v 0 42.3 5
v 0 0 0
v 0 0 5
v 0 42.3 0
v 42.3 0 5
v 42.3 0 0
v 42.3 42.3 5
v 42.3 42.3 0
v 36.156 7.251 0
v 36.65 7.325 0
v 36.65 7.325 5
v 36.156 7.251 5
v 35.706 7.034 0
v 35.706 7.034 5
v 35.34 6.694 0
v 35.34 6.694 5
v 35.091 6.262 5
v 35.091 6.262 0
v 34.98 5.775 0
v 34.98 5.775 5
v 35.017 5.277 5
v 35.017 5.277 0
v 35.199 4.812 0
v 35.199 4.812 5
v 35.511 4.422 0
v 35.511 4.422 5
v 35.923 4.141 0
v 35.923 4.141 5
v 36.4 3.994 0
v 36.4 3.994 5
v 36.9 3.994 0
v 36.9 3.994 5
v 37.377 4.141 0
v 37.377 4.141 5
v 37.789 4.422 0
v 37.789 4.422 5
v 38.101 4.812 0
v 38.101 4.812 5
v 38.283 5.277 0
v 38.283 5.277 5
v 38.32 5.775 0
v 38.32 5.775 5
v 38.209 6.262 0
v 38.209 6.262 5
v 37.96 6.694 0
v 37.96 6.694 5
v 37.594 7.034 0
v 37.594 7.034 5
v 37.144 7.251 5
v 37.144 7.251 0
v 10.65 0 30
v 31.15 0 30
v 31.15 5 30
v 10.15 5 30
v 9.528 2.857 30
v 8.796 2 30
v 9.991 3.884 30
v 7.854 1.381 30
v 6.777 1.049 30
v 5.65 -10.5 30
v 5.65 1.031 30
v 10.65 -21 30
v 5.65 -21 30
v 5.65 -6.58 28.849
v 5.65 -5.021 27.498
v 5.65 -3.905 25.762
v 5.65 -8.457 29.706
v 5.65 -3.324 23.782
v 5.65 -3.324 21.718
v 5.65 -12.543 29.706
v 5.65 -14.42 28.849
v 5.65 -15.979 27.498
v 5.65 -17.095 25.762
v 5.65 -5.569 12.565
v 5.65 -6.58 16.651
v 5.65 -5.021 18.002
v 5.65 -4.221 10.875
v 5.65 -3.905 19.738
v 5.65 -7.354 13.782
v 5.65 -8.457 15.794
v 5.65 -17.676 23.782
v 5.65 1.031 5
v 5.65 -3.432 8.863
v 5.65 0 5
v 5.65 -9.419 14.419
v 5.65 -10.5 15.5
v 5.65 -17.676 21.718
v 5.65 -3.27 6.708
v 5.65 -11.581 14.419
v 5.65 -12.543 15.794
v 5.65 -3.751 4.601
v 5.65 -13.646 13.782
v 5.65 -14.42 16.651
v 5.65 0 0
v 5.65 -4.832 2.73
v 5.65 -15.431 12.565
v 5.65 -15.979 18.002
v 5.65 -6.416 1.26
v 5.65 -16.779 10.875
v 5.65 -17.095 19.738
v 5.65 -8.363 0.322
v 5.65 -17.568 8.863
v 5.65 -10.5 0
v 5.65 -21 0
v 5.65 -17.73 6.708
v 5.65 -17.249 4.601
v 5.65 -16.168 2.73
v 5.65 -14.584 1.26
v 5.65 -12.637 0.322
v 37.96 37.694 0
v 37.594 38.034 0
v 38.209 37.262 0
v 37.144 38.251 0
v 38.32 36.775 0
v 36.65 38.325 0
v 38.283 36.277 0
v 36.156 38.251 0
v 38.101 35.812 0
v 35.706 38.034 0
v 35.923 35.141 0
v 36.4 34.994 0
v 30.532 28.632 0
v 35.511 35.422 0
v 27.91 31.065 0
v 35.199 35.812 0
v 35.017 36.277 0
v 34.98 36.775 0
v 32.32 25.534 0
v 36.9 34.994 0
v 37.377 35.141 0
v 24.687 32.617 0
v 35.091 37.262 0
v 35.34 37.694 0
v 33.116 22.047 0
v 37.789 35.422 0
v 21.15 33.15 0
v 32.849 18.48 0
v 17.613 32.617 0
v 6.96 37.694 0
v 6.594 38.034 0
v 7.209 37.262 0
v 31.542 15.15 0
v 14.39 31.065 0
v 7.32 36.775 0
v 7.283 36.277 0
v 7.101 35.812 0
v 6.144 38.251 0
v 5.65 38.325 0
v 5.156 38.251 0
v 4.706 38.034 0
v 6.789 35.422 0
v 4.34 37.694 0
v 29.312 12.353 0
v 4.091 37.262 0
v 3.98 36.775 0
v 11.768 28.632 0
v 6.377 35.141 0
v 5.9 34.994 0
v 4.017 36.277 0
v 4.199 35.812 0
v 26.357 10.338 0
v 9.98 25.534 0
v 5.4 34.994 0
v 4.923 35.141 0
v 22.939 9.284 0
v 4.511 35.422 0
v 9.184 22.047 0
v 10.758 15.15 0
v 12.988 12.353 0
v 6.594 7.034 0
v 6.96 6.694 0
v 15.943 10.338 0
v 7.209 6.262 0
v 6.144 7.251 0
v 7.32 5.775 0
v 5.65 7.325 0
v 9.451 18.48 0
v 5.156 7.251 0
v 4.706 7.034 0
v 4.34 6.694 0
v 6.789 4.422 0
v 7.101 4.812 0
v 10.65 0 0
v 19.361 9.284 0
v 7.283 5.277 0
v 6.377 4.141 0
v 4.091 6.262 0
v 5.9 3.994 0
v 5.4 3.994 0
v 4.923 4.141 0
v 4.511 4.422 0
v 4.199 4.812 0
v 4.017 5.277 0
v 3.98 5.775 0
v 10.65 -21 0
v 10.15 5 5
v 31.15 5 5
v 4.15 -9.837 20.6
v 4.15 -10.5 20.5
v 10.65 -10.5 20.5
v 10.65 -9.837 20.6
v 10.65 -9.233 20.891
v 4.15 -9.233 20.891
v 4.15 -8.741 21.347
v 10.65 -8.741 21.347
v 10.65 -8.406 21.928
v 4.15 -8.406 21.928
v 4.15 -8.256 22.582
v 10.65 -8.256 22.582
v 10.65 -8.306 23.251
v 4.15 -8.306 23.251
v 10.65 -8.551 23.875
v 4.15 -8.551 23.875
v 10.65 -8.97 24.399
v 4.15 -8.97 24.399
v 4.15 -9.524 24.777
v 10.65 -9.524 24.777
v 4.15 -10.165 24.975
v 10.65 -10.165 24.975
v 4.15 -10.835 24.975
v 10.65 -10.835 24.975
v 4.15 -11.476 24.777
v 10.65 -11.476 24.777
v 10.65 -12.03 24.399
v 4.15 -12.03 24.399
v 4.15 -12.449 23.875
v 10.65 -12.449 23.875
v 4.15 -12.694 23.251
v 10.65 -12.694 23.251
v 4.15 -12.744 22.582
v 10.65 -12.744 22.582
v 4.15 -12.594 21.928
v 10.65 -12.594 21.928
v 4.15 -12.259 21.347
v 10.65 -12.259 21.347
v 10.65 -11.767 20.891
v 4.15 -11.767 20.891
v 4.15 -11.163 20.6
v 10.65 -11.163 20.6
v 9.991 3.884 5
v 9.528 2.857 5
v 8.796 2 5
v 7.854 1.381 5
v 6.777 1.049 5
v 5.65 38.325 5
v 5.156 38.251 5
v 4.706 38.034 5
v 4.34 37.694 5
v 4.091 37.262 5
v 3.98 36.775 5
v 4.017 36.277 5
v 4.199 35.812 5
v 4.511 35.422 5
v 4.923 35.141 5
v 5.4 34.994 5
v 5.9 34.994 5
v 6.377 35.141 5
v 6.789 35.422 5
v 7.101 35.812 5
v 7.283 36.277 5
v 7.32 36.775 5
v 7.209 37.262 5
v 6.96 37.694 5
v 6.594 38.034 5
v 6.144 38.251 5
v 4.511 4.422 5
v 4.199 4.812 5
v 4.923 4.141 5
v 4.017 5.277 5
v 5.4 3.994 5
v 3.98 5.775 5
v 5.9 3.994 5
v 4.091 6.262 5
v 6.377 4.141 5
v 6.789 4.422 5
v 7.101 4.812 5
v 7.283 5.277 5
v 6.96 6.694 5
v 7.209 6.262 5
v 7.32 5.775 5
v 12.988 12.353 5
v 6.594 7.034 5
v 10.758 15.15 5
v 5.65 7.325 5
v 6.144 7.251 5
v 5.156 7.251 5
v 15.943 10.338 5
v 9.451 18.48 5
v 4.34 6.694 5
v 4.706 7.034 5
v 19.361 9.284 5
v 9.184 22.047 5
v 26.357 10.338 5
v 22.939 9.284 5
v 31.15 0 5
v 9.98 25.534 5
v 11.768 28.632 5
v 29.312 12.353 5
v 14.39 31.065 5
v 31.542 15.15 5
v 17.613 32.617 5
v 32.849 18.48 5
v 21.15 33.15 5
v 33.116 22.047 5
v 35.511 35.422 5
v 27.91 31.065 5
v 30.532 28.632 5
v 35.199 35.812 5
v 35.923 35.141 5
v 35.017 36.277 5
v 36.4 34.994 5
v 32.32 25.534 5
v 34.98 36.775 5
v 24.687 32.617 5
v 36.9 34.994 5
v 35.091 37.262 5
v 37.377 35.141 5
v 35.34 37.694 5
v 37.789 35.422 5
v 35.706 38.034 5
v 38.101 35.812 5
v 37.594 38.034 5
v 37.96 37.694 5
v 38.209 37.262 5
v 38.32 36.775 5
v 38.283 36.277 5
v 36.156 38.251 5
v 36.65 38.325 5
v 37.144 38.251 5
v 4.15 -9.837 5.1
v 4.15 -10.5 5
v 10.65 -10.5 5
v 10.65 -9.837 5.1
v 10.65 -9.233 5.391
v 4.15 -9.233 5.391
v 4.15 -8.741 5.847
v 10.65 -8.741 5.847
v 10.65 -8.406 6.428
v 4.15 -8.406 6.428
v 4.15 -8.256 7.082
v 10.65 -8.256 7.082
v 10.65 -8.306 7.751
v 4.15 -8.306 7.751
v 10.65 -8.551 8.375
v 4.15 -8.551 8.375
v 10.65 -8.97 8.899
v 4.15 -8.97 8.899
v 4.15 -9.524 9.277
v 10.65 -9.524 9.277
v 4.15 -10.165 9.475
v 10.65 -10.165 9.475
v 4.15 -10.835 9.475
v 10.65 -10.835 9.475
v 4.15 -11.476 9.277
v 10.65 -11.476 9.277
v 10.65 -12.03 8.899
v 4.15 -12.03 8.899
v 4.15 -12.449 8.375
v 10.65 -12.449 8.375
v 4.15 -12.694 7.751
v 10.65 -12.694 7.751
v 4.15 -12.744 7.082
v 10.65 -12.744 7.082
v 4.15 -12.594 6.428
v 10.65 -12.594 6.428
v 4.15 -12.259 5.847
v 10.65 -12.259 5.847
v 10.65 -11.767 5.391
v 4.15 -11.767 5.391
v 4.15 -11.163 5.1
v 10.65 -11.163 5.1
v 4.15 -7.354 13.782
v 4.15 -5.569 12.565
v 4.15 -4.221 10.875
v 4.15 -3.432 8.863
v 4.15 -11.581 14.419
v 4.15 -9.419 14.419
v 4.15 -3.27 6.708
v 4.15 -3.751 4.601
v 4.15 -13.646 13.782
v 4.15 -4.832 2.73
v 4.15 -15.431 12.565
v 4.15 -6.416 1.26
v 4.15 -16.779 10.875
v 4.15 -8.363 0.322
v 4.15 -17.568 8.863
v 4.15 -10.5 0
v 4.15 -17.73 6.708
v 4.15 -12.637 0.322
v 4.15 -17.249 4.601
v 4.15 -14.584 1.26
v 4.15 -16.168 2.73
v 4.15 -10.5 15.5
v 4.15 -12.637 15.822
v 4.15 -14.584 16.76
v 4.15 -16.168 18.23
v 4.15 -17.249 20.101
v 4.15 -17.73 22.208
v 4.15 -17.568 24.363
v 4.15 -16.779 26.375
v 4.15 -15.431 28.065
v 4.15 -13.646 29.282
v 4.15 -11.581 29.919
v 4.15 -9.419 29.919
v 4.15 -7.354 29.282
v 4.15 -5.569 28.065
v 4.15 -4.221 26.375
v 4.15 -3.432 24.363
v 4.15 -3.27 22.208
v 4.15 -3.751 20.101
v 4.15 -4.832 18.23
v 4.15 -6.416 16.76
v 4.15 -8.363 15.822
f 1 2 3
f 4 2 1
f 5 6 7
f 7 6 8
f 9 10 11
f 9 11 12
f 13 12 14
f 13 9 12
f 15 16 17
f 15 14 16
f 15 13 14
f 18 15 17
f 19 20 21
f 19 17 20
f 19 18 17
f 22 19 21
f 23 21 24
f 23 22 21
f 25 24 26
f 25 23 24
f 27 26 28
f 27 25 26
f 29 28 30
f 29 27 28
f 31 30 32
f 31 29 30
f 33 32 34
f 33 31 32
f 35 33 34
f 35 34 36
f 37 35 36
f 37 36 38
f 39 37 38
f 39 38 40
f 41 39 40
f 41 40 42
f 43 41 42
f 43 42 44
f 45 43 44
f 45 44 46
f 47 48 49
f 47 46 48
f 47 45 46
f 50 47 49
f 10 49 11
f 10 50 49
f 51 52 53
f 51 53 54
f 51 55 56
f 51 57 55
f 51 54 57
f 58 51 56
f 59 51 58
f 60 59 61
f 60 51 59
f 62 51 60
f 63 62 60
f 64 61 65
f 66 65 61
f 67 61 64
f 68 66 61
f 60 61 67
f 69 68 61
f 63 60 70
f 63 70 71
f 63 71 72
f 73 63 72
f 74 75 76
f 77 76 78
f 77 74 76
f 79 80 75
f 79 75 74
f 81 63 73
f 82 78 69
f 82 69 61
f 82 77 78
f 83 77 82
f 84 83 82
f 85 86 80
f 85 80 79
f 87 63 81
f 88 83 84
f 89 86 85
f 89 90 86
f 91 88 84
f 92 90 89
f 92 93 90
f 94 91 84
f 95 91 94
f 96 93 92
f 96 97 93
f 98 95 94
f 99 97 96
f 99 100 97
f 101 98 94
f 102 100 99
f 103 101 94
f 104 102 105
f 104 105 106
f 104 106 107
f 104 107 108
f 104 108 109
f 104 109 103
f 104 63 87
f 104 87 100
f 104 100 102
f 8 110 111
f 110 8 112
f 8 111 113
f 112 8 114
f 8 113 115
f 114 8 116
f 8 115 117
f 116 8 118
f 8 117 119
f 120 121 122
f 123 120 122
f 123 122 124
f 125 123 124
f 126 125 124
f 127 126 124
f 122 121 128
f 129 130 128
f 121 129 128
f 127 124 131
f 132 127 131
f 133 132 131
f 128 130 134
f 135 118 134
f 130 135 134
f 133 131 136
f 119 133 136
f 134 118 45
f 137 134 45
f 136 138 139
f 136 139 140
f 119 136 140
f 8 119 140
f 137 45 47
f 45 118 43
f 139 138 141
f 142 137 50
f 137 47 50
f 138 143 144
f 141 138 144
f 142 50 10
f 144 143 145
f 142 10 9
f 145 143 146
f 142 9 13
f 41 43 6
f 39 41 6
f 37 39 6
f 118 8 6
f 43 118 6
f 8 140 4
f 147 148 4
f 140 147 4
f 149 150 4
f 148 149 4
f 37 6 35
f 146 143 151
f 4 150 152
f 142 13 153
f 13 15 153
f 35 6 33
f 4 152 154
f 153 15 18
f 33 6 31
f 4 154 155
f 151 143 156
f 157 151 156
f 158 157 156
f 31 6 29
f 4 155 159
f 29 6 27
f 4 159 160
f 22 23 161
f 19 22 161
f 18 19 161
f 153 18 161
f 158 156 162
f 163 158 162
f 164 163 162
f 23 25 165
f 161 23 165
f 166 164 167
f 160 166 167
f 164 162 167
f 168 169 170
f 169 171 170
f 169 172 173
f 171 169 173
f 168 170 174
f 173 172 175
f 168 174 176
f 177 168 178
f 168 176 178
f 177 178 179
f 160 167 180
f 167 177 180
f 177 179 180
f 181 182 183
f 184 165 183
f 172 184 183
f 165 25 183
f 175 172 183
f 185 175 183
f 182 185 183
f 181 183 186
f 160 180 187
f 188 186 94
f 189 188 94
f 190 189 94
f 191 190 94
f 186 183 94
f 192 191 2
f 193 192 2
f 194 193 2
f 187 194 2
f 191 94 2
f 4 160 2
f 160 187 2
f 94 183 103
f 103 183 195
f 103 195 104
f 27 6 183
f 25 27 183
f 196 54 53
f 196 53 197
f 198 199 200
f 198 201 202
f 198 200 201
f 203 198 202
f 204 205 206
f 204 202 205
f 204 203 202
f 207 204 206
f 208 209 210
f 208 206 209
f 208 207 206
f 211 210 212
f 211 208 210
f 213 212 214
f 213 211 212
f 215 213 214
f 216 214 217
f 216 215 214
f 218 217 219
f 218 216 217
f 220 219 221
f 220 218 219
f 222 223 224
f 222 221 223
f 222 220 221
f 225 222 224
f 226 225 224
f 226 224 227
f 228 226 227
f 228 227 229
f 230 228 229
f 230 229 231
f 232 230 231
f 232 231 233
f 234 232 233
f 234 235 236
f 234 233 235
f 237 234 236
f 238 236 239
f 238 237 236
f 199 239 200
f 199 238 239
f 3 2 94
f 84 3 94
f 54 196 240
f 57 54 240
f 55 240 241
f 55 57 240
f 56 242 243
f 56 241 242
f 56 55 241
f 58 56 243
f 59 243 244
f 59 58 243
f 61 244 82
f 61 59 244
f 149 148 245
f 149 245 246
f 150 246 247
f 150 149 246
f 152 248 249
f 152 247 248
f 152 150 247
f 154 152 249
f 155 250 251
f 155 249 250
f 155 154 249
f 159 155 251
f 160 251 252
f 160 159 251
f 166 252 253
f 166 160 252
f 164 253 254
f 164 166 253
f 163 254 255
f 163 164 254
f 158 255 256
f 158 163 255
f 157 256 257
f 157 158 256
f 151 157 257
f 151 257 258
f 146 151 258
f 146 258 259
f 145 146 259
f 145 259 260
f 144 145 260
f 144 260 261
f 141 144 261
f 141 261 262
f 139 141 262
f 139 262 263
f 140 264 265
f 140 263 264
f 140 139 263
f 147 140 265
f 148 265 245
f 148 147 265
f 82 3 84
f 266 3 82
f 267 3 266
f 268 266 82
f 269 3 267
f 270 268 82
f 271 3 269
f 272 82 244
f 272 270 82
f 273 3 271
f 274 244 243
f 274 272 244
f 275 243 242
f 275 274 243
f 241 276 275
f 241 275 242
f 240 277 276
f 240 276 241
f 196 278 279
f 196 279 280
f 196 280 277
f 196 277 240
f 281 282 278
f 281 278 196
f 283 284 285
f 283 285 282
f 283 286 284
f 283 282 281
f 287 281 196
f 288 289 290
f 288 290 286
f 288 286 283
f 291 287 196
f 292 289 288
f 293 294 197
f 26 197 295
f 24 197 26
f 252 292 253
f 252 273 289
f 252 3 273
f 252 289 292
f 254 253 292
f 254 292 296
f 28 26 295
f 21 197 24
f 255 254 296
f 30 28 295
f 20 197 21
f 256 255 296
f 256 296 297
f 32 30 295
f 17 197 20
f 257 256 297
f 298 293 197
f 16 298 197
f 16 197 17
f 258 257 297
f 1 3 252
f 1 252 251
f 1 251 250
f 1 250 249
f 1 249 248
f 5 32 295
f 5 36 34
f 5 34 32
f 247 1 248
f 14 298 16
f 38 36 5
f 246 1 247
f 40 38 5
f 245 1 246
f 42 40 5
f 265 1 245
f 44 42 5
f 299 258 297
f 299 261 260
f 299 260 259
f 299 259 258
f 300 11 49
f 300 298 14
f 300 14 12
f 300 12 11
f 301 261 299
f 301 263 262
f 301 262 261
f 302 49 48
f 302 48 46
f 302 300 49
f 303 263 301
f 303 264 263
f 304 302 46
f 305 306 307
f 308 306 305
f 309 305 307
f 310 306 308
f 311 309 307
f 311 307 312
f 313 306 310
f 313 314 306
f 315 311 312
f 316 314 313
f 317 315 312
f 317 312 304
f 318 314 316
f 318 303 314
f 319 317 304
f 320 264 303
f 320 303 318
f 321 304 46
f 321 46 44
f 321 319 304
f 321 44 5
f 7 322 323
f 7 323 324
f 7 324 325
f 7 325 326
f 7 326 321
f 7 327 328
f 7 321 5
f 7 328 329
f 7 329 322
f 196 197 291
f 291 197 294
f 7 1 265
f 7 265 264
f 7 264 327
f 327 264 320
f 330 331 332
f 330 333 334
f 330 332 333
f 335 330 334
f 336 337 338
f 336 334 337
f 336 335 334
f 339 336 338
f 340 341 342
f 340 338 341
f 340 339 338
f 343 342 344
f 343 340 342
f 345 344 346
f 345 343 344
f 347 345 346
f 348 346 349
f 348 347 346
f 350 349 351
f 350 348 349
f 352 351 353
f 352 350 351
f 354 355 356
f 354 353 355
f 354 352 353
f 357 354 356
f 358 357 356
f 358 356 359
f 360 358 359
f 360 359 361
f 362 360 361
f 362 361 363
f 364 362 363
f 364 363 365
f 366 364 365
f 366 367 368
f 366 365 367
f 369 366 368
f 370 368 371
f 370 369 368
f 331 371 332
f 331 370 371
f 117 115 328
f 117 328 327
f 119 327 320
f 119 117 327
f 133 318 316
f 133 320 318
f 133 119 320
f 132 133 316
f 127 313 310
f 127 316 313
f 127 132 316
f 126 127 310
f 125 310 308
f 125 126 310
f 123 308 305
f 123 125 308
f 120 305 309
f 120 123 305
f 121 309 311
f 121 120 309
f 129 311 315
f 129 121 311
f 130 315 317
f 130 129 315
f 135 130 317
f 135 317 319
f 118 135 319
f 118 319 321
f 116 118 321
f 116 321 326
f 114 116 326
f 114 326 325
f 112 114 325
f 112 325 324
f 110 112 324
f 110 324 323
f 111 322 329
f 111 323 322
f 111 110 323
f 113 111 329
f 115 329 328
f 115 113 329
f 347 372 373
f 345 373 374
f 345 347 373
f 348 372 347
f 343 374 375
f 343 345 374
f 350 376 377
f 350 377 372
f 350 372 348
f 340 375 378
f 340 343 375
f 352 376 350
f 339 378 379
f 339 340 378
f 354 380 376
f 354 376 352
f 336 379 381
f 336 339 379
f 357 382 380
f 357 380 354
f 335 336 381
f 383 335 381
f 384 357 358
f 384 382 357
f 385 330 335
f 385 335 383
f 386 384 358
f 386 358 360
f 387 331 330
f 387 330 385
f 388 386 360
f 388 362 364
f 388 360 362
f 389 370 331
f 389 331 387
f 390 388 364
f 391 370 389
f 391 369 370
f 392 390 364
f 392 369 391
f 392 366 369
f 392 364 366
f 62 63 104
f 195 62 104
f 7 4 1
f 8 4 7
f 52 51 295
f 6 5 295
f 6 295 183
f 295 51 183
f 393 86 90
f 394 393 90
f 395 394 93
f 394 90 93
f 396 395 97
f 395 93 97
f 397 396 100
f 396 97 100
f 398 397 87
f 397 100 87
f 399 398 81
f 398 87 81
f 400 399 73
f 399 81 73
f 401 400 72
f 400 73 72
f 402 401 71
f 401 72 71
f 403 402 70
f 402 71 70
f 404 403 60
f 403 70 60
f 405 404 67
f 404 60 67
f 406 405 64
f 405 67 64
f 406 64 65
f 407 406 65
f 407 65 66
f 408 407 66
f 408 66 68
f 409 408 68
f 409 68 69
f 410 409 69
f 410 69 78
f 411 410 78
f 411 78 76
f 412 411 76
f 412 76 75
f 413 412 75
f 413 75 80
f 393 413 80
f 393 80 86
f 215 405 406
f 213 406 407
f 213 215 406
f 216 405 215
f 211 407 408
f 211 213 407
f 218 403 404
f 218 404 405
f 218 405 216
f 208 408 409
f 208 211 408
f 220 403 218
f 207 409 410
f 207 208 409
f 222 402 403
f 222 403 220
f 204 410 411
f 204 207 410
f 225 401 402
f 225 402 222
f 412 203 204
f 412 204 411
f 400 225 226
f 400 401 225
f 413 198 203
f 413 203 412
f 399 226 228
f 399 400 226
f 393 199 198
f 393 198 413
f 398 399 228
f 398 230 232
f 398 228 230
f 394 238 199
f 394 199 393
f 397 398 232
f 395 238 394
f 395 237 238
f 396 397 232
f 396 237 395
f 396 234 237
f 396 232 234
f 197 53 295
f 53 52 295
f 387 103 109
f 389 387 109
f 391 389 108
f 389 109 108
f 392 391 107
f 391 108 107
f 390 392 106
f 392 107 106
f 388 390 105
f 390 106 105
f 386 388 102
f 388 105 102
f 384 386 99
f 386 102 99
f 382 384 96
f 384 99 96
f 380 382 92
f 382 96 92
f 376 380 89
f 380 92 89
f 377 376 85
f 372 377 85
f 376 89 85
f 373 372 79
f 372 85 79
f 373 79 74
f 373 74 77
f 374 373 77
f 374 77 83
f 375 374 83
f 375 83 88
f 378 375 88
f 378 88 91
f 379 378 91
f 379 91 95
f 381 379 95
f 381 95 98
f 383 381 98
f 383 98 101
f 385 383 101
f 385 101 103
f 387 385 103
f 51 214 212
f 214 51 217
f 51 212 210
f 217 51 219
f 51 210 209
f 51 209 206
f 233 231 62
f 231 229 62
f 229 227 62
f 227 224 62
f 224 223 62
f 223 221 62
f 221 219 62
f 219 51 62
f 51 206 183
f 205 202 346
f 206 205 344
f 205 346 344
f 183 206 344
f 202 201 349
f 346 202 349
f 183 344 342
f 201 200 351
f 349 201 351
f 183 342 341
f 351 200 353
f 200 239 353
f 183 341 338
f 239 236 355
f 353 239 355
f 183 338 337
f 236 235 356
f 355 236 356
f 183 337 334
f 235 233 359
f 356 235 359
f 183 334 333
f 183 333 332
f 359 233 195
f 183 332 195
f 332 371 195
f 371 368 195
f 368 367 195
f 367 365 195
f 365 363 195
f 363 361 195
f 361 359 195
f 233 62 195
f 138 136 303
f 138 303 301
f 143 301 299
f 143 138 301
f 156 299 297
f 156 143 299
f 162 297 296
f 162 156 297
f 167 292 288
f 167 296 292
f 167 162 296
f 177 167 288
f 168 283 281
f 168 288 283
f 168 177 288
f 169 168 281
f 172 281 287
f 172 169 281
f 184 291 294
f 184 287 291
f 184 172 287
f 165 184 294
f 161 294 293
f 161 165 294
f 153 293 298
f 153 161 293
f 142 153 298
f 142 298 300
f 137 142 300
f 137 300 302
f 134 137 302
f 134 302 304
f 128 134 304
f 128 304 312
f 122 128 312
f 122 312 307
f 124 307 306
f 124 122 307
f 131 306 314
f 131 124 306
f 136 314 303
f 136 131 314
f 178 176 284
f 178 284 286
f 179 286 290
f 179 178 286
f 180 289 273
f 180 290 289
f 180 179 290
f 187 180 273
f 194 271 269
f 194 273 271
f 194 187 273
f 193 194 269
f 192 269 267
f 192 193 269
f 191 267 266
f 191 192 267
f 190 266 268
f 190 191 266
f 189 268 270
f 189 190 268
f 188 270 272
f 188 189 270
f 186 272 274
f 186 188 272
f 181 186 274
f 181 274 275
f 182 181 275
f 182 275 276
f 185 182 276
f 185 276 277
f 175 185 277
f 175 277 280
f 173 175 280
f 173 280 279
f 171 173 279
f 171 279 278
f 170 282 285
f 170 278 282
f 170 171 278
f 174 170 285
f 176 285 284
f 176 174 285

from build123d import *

# Parameters (mm, degrees)
CUBE003_W                     = 500
CUBE003_H                     = 500
CUBE003_DEPTH                 = 500
CYLINDER006_R                 = 2.25
CYLINDER006_DEPTH             = 1000
CYLINDER005_R                 = 2.25
CYLINDER005_DEPTH             = 1000
CYLINDER004_R                 = 7.25
CYLINDER004_DEPTH             = 6.5
CYLINDER003_R                 = 7.25
CYLINDER003_DEPTH             = 6.5
GROUP003_PLACEMENT_ANGLE      = 180
CYLINDER002_R                 = 7.25
CYLINDER002_DEPTH             = 6.5
CYLINDER001_R                 = 7.25
CYLINDER001_DEPTH             = 6.5
CYLINDER_R                    = 4
CYLINDER_DEPTH                = 200
CUBE002_W                     = 60
CUBE002_H                     = 21
CUBE002_DEPTH                 = 21
CUBE001_W                     = 30
CUBE001_H                     = 31
CUBE001_DEPTH                 = 26
DIFFERENCE002_PITCH_ANGLE     = 90
DIFFERENCE002_PLACEMENT_ANGLE = 90
REFINELINEAREXTRUDE_R         = 12
REFINELINEAREXTRUDE_R_2       = 1.675
LINEAREXTRUDE_DEPTH           = 20
CUBE_W                        = 42.3
CUBE_H                        = 42.3
CUBE_DEPTH                    = 5


with BuildPart() as cube003:
    # cube003 → cube003 (new body)
    with BuildSketch(Plane(origin=(-250, -510, -250), x_dir=(1, 0, 0), z_dir=(0, 0, 1))):
        with Locations((250, 250)):
            Rectangle(CUBE003_W, CUBE003_H)
    extrude(amount=CUBE003_DEPTH)


with BuildPart() as cylinder006:
    # cylinder006 → cylinder006 (new body)
    with BuildSketch(Plane(origin=(15.5, 500, 0), x_dir=(1, 0, 0), z_dir=(0, -1, 0))):
        Circle(CYLINDER006_R)
    extrude(amount=CYLINDER006_DEPTH)


with BuildPart() as union002:
    # cylinder005 → cylinder005 (new body)
    with BuildSketch(Plane.XZ.offset(-500)):
        Circle(CYLINDER005_R)
    extrude(amount=CYLINDER005_DEPTH)

    # Group005: union cylinder006
    add(cylinder006.part)


with BuildPart() as union002_1:
    # Group005 placement: moved
    add(union002.part.moved(Location((2.25, 0, -15.5))))

    # union002: union cube003
    add(cube003.part)


with BuildPart() as cylinder004:
    # cylinder004 → cylinder004 (new body)
    with BuildSketch(Plane(origin=(15.5, 0, 0), x_dir=(1, 0, 0), z_dir=(0, -1, 0))):
        Circle(CYLINDER004_R)
    extrude(amount=CYLINDER004_DEPTH)


with BuildPart() as group003:
    # cylinder003 → cylinder003 (new body)
    with BuildSketch(Plane.XZ):
        Circle(CYLINDER003_R)
    extrude(amount=CYLINDER003_DEPTH)

    # Group003: union cylinder004
    add(cylinder004.part)


with BuildPart() as group003_1:
    # Group003 placement: moved
    add(group003.part.moved(Location((2.25, 10.5, -15.5))).rotate(Axis((2.25, 10.5, -15.5), (1, 0, 0)), GROUP003_PLACEMENT_ANGLE))


with BuildPart() as cylinder002:
    # cylinder002 → cylinder002 (new body)
    with BuildSketch(Plane(origin=(15.5, 0, 0), x_dir=(1, 0, 0), z_dir=(0, -1, 0))):
        Circle(CYLINDER002_R)
    extrude(amount=CYLINDER002_DEPTH)


with BuildPart() as group004:
    # cylinder001 → cylinder001 (new body)
    with BuildSketch(Plane.XZ):
        Circle(CYLINDER001_R)
    extrude(amount=CYLINDER001_DEPTH)

    # Group002: union cylinder002
    add(cylinder002.part)


with BuildPart() as group004_1:
    # Group002 placement: moved
    add(group004.part.moved(Location((2.25, -10.5, -15.5))))

    # Group004: union Group003
    add(group003_1.part)


with BuildPart() as cylinder:
    # cylinder → cylinder (new body)
    with BuildSketch(Plane(origin=(-100, 15, 13), x_dir=(0, 1, 0), z_dir=(1, 0, 0))):
        Circle(CYLINDER_R)
    extrude(amount=CYLINDER_DEPTH)


with BuildPart() as union:
    # cube002 → cube002 (new body)
    with BuildSketch(Plane(origin=(-30, -10.5, -13), x_dir=(1, 0, 0), z_dir=(0, 0, 1))):
        with Locations((30, 10.5)):
            Rectangle(CUBE002_W, CUBE002_H)
    extrude(amount=CUBE002_DEPTH)

    # union: union cylinder
    add(cylinder.part)


with BuildPart() as difference002:
    # cube001 → cube001 (new body)
    with BuildSketch(Plane(origin=(-15, -15.5, -13), x_dir=(1, 0, 0), z_dir=(0, 0, 1))):
        with Locations((15, 15.5)):
            Rectangle(CUBE001_W, CUBE001_H)
    extrude(amount=CUBE001_DEPTH)

    # difference001: cut union
    add(union.part, mode=Mode.SUBTRACT)


with BuildPart() as difference002_1:
    # difference001 placement: moved
    add(difference002.part.moved(Location((10, 0, -13))))

    # union001: union Group004
    add(group004_1.part)

    # difference002: cut union002
    add(union002_1.part, mode=Mode.SUBTRACT)


with BuildPart() as difference002_2:
    # difference002 pitch: moved
    add(difference002_1.part.rotate(Axis((0, 0, 0), (0, 1, 0)), DIFFERENCE002_PITCH_ANGLE))


with BuildPart() as difference002_3:
    # difference002 placement: moved
    add(difference002_2.part.moved(Location((21.15, 5, 25))).rotate(Axis((21.15, 5, 25), (0, 0, 1)), DIFFERENCE002_PLACEMENT_ANGLE))


with BuildPart() as linearextrude:
    # RefineLinearExtrude → LinearExtrude (new body)
    with BuildSketch(Plane(origin=(0, 0, 0), x_dir=(0, 1, 0), z_dir=(0, 0, 1))):
        Circle(REFINELINEAREXTRUDE_R)
        with Locations((15.5, -15.5)):
            Circle(REFINELINEAREXTRUDE_R_2)
        with Locations((15.5, 15.5)):
            Circle(REFINELINEAREXTRUDE_R_2)
        with Locations((-15.5, 15.5)):
            Circle(REFINELINEAREXTRUDE_R_2)
        with Locations((-15.5, -15.5)):
            Circle(REFINELINEAREXTRUDE_R_2)
    extrude(amount=LINEAREXTRUDE_DEPTH)


with BuildPart() as linearextrude_1:
    # LinearExtrude placement: moved
    add(linearextrude.part.moved(Location((21.15, 21.15, -10))))


with BuildPart() as group006:
    # cube → cube (new body)
    with BuildSketch(Plane.XY):
        with Locations((21.15, 21.15)):
            Rectangle(CUBE_W, CUBE_H)
    extrude(amount=CUBE_DEPTH)

    # difference: cut LinearExtrude
    add(linearextrude_1.part, mode=Mode.SUBTRACT)

    # Group006: union difference002
    add(difference002_3.part)


solid = group006.part
